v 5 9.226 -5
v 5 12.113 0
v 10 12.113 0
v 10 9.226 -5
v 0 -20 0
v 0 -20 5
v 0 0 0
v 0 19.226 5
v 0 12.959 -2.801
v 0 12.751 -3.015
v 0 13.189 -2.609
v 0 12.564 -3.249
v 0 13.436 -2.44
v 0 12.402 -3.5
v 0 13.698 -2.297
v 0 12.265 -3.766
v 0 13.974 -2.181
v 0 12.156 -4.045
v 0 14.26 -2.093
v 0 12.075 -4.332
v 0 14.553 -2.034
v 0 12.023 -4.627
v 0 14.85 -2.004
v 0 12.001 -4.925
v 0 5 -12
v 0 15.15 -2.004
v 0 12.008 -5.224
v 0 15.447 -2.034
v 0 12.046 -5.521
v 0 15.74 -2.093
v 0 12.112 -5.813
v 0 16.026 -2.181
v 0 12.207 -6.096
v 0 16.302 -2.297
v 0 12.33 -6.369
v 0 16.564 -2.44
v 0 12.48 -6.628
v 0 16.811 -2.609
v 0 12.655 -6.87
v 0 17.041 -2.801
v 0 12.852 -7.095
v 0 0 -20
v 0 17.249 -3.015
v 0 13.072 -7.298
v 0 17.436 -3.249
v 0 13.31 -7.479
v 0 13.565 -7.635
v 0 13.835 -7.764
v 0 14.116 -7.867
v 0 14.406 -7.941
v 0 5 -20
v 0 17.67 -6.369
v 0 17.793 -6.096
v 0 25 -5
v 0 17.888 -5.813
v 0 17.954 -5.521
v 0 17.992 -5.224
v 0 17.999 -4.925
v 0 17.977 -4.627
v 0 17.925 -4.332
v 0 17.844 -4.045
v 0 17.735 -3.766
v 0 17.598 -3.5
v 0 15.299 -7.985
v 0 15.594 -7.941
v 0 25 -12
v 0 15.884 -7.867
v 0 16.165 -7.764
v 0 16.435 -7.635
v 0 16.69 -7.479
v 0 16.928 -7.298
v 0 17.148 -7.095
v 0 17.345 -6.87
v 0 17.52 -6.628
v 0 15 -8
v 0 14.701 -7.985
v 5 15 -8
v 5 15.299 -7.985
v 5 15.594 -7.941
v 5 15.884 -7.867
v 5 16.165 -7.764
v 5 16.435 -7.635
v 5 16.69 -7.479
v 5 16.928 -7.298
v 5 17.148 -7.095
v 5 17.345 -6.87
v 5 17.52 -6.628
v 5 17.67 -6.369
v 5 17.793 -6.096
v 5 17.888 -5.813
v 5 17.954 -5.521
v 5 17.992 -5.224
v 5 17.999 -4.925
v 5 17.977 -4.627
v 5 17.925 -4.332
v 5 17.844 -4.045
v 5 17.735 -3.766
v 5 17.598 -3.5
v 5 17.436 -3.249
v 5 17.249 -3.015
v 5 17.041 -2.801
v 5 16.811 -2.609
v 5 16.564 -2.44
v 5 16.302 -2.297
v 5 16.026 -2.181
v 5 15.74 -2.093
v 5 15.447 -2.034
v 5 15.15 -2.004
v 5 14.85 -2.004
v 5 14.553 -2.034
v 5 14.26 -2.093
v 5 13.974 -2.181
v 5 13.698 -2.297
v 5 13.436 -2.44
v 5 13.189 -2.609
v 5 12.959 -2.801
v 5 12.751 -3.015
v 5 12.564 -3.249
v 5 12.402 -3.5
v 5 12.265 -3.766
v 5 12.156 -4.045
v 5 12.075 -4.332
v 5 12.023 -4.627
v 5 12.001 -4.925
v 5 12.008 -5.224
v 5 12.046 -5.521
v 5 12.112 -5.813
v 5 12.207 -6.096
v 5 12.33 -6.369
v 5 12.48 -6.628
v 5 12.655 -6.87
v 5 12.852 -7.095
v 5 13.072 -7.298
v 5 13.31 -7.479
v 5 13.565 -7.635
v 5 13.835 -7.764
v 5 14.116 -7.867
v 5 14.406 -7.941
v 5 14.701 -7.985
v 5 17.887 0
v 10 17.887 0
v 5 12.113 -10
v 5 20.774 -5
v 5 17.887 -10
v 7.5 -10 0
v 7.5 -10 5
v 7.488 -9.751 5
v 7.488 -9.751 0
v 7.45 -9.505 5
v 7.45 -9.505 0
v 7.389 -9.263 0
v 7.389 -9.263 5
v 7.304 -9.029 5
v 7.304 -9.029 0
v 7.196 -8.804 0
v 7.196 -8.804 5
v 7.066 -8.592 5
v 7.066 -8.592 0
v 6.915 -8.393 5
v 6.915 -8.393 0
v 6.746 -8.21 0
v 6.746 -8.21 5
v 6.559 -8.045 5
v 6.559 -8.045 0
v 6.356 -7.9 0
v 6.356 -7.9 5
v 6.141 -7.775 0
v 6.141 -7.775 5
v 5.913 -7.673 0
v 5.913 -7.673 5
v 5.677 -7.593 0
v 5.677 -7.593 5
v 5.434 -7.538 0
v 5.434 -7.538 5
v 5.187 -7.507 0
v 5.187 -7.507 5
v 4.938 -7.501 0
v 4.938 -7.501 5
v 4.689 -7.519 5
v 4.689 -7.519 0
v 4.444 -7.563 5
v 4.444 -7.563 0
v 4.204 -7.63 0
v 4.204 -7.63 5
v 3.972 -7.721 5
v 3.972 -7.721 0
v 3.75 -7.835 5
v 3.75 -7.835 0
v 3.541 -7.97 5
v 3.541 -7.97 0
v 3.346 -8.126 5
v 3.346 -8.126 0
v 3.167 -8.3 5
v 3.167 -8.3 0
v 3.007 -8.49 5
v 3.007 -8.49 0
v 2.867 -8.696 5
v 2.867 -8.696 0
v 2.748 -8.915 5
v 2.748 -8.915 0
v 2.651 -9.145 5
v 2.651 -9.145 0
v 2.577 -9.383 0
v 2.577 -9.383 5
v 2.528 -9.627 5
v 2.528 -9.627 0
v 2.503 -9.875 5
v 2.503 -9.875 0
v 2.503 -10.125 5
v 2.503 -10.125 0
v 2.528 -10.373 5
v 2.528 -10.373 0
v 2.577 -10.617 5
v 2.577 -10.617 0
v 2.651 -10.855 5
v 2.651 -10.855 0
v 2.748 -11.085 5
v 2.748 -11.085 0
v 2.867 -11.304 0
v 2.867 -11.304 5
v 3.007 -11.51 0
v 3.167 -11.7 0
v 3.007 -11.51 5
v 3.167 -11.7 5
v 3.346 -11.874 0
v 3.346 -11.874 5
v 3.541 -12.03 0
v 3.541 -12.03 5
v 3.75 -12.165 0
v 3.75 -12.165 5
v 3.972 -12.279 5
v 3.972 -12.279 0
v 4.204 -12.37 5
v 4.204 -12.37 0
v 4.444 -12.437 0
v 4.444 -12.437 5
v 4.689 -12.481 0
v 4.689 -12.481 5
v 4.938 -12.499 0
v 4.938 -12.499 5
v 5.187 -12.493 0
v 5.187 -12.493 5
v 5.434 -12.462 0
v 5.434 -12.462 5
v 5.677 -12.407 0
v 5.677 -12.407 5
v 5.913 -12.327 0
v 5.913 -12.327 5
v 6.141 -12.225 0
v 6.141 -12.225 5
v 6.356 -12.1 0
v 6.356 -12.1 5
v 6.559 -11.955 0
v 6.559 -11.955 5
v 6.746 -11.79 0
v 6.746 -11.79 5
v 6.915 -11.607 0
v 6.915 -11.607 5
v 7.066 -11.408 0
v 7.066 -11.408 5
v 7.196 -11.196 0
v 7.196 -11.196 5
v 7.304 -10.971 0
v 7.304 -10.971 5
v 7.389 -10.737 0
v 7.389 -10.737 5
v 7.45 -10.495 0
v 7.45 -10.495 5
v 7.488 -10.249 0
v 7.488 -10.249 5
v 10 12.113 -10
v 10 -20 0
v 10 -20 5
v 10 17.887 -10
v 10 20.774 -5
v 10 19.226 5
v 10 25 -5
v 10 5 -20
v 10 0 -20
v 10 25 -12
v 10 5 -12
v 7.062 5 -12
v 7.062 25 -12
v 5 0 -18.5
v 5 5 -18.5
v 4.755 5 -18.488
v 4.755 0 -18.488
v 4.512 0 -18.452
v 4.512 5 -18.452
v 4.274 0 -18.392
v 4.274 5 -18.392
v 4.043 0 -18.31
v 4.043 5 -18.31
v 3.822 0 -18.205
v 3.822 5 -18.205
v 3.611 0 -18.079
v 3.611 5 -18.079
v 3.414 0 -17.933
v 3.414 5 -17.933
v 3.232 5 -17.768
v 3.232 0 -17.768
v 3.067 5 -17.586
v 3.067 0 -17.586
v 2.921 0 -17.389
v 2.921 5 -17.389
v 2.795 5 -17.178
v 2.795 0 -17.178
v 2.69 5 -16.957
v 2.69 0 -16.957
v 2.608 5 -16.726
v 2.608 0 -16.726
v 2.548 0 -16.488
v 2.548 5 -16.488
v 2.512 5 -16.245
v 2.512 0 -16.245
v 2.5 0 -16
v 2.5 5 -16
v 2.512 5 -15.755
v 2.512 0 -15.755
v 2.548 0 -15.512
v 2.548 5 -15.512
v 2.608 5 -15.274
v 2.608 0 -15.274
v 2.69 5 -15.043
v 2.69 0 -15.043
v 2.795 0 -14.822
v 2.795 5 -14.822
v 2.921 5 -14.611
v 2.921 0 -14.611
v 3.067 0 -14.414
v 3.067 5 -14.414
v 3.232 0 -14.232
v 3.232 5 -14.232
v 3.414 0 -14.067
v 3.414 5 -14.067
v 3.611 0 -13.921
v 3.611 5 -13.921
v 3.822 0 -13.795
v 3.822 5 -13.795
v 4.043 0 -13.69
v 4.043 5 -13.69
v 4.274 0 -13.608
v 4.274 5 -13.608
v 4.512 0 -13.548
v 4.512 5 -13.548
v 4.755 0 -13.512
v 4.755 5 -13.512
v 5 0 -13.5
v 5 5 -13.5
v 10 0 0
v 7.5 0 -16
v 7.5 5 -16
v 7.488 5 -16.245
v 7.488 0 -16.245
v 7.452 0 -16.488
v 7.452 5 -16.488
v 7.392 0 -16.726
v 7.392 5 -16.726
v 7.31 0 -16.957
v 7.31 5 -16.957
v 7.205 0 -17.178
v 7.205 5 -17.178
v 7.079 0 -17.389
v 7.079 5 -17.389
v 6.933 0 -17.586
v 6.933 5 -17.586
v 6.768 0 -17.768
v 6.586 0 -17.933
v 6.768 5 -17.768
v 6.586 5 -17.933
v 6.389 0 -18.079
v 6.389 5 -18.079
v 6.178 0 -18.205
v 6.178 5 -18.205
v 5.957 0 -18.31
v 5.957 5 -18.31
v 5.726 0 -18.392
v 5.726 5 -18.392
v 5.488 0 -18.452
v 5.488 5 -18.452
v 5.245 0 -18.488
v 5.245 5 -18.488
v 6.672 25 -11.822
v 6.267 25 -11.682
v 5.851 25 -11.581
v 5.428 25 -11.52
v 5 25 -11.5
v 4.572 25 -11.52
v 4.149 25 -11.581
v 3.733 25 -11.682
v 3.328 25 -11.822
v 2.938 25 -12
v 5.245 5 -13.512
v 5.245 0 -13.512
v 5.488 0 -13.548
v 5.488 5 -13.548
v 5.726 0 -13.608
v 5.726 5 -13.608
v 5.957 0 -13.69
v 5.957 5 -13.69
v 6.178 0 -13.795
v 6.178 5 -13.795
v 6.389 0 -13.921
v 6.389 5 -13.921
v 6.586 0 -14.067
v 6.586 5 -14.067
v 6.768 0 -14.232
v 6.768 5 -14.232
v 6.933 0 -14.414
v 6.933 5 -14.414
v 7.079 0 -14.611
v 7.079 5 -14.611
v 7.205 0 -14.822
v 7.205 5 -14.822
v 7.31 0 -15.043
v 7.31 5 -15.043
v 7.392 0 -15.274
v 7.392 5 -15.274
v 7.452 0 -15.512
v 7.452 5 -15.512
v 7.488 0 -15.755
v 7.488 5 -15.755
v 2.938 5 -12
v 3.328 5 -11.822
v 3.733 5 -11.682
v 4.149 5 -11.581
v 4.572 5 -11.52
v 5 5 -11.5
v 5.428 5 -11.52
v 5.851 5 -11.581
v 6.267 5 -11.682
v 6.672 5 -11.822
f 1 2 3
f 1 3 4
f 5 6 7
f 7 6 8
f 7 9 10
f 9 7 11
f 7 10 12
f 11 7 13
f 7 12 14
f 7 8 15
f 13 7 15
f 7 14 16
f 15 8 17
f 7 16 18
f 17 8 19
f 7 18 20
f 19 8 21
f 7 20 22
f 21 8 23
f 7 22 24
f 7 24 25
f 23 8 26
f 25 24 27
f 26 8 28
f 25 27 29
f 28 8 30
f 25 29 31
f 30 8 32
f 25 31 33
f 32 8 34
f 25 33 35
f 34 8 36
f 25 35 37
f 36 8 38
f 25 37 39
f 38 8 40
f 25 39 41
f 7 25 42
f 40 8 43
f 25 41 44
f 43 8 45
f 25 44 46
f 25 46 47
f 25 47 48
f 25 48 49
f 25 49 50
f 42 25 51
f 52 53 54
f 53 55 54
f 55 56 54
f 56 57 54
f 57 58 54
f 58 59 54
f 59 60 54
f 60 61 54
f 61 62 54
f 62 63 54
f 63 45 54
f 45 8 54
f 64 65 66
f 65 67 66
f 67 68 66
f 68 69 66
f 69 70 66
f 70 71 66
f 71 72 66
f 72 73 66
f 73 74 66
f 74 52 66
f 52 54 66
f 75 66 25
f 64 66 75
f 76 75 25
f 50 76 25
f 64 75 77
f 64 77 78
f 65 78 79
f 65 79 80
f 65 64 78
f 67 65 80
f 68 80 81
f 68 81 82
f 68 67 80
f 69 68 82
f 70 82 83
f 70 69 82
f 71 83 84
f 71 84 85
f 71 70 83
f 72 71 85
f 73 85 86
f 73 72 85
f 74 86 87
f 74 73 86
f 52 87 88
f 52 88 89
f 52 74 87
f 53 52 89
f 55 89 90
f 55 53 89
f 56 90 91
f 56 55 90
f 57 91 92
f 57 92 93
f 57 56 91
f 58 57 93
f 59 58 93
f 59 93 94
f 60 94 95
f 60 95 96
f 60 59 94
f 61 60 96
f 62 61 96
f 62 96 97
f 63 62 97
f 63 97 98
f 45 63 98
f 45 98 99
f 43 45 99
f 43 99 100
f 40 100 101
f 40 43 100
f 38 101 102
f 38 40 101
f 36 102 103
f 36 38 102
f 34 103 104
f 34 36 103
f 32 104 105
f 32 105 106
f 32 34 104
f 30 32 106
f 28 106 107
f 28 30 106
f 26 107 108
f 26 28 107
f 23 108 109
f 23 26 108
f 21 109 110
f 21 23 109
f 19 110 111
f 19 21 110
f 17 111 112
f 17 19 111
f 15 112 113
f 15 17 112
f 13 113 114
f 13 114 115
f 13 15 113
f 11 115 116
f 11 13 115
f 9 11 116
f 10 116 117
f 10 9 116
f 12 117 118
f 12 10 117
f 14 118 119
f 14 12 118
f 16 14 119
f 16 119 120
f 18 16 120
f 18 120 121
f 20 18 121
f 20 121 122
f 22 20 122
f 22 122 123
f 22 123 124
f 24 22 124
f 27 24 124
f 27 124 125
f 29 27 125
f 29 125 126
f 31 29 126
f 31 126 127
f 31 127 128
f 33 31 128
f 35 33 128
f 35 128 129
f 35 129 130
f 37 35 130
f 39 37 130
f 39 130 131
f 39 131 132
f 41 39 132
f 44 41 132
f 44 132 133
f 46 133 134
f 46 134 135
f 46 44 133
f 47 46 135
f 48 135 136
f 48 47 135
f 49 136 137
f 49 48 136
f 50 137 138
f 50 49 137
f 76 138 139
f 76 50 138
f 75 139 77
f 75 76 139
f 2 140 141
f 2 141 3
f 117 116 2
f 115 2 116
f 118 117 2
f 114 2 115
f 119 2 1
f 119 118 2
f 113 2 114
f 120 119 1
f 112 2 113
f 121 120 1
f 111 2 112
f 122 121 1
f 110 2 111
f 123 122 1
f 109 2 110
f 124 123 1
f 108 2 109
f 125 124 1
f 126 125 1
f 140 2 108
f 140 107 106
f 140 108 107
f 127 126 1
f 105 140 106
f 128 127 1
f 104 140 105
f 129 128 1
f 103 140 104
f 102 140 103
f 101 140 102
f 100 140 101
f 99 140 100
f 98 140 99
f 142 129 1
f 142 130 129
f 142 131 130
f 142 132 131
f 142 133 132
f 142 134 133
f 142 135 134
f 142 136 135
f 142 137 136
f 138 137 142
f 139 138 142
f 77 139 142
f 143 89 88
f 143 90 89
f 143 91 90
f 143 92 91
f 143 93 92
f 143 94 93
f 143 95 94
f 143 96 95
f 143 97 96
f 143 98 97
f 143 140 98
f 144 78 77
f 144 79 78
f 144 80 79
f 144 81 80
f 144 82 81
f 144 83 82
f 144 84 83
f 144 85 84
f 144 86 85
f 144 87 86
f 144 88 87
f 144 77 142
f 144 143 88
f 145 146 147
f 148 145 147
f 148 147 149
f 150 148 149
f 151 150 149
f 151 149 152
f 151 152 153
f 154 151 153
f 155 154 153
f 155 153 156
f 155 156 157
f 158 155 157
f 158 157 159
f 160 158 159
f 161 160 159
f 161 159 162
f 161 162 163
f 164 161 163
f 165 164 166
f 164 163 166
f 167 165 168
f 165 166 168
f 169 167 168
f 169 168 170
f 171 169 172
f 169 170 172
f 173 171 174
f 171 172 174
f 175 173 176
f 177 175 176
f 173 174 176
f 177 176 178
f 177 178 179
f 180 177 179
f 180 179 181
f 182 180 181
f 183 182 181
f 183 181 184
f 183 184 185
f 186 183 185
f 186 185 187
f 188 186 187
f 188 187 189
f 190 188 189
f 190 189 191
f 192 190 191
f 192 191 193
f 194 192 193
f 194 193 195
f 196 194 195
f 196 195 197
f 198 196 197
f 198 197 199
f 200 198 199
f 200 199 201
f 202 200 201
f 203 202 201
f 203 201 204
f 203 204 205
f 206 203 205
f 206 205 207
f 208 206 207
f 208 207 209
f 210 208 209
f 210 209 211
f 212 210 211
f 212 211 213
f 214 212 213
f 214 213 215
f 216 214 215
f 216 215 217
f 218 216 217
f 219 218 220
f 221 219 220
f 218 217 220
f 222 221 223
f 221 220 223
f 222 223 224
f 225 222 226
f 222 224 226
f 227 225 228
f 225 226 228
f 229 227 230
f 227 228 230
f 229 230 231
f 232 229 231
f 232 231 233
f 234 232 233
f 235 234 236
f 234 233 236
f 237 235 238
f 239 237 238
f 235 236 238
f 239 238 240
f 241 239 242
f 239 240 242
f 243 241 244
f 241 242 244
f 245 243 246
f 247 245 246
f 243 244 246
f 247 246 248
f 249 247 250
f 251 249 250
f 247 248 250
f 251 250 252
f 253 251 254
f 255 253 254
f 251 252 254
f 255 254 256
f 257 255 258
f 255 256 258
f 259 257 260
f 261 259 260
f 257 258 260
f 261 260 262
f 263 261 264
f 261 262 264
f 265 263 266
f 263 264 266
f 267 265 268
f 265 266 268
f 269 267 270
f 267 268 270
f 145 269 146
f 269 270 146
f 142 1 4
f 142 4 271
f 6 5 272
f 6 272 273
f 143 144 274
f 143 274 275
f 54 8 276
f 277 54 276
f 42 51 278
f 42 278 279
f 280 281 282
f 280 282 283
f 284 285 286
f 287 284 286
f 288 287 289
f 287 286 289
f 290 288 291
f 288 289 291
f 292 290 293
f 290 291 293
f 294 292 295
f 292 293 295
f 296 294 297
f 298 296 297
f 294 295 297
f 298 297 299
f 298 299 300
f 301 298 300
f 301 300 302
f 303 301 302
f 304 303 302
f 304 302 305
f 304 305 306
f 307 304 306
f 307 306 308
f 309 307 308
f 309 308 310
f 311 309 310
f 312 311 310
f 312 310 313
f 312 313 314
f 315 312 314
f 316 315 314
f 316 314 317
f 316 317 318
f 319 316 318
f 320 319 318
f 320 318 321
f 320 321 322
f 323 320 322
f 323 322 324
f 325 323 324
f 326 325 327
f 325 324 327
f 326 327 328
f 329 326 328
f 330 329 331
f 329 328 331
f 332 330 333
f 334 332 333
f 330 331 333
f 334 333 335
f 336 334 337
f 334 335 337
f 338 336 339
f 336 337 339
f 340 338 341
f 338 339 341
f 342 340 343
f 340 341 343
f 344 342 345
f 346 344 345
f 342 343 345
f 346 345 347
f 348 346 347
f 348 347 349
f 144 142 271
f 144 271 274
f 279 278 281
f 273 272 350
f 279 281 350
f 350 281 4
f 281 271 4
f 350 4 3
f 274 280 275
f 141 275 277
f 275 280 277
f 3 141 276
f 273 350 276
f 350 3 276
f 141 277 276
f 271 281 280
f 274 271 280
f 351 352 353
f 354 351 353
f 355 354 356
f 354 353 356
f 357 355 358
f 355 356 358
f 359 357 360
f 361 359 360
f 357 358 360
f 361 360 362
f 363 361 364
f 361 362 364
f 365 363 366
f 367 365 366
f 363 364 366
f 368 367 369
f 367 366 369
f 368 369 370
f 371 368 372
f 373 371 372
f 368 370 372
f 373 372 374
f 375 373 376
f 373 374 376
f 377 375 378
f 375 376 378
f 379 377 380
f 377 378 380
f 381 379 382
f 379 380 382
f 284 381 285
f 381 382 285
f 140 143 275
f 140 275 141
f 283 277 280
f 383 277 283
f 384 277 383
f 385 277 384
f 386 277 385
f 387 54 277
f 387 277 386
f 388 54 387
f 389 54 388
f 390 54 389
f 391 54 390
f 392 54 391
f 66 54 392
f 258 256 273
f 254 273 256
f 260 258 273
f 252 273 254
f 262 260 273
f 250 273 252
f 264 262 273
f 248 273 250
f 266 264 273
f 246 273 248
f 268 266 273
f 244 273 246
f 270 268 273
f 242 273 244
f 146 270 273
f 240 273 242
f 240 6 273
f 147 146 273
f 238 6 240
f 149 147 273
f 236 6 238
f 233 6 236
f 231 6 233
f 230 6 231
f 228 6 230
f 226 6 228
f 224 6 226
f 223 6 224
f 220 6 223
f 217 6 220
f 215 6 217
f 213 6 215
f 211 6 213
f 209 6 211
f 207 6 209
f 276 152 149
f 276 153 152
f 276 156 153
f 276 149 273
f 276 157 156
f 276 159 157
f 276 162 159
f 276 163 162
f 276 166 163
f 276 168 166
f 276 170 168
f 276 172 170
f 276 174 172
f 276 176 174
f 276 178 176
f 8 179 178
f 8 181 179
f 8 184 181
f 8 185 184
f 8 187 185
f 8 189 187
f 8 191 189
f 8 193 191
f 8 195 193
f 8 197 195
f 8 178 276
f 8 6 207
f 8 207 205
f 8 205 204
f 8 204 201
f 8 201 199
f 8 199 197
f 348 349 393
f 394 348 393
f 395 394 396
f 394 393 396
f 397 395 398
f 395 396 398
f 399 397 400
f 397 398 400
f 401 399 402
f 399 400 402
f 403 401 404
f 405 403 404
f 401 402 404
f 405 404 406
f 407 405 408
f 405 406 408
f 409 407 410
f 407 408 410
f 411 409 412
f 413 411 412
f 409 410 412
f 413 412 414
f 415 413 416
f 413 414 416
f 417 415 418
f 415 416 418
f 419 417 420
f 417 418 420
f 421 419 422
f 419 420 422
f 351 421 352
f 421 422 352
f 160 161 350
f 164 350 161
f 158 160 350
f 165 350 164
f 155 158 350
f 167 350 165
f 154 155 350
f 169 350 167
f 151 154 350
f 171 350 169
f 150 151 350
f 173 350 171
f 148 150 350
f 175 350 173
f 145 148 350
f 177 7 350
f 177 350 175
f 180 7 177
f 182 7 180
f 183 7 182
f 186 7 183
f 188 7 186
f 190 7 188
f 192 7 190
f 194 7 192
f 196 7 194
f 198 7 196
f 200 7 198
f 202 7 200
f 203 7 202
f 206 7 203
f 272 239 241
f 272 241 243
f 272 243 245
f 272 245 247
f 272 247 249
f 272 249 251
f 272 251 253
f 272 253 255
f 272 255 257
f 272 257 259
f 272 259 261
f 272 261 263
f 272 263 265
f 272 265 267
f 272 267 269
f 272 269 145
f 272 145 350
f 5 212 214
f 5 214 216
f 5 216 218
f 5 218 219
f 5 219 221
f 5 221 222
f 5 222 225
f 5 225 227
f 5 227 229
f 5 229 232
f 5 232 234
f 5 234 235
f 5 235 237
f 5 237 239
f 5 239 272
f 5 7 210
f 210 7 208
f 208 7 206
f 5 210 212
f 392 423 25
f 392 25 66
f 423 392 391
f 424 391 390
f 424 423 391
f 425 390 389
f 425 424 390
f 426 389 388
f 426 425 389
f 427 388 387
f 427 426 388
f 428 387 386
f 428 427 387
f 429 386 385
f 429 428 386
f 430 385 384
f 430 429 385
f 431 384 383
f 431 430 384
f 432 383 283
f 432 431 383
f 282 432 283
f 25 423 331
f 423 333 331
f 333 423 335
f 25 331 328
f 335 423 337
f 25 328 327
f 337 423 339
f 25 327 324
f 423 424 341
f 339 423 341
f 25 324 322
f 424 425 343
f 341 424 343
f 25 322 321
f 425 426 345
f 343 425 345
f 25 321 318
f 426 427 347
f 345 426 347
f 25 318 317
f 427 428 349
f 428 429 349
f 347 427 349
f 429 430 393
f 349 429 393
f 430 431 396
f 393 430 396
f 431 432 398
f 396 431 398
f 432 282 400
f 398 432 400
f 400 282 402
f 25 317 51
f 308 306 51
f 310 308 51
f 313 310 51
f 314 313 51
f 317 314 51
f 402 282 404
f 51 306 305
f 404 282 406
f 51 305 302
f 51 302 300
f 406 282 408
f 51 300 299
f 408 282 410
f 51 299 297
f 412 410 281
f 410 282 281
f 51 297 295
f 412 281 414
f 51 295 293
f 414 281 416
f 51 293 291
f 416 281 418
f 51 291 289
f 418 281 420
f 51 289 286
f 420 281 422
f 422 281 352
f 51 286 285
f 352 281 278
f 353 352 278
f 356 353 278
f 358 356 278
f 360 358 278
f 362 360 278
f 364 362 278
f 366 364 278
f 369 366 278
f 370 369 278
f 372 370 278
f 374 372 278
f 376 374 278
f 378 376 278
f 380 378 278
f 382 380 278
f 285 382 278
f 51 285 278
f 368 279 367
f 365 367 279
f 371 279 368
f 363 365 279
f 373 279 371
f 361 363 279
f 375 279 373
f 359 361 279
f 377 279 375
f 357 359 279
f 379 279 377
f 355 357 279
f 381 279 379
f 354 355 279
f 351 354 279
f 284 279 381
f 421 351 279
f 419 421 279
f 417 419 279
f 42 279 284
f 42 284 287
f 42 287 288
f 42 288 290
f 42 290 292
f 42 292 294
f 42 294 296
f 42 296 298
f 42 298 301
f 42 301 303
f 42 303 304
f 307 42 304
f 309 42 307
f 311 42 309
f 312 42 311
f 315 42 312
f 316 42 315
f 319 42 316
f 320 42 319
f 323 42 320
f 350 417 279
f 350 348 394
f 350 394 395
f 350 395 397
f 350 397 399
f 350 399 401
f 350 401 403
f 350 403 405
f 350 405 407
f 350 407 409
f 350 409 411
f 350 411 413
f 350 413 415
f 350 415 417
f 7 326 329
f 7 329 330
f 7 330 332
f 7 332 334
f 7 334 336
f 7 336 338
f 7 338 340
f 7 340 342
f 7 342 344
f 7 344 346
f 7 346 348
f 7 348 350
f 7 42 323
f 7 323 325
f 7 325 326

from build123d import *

# Parameters (mm, degrees)
SKETCH_1_R          = 3
EXTRUDE_1_DEPTH     = 5
EXTRUDE_START       = 5
EXTRUDE_2_DEPTH     = 5
SKETCH_3_R          = 2.5
CUT_EXTRUDE_1_DEPTH = 37.742346142
CHAMFER_1_SIZE      = 10
CHAMFER_1_SIZE2     = 5.773502692
SKETCH_4_W          = 8
SKETCH_4_H          = 20
CUT_EXTRUDE_2_DEPTH = 34.541019662
SKETCH_5_R          = 4.5
CUT_EXTRUDE_3_DEPTH = 34.541019662
CUT_EXTRUDE_4_DEPTH = 34.541019662


with BuildPart() as part:
    # 스케치1 → 보스-돌출1 (new body)
    # profile 1 of 2: a face of its own
    with BuildSketch(Plane(origin=(0, 0, 0), x_dir=(0, 0, -1), z_dir=(1, 0, 0))):
        Polygon((20, 0), (0, 0), (0, -20), (-5, -20), (-5, 25), (20, 25), align=None)
        Polygon((10, 17.886751346), (5, 20.773502692), (0, 17.886751346), (0, 12.113248654), (5, 9.226497308), (10, 12.113248654), align=None, mode=Mode.SUBTRACT)
    # profile 2 of 2: a face of its own
    with BuildSketch(Plane(origin=(0, 0, 0), x_dir=(0, 0, -1), z_dir=(1, 0, 0))):
        Polygon((10, 12.113248654), (10, 17.886751346), (5, 20.773502692), (0, 17.886751346), (0, 12.113248654), (5, 9.226497308), align=None)
        with Locations((5, 15)):
            Circle(SKETCH_1_R, mode=Mode.SUBTRACT)
    extrude(amount=EXTRUDE_1_DEPTH)

    # 스케치1<3> → 보스-돌출2 (add)
    with BuildSketch(Plane(origin=(0, 0, 0), x_dir=(0, 0, -1), z_dir=(1, 0, 0)).offset(EXTRUDE_START)):
        Polygon((20, 0), (0, 0), (0, -20), (-5, -20), (-5, 25), (20, 25), align=None)
        Polygon((10, 17.886751346), (5, 20.773502692), (0, 17.886751346), (0, 12.113248654), (5, 9.226497308), (10, 12.113248654), align=None, mode=Mode.SUBTRACT)
    extrude(amount=EXTRUDE_2_DEPTH)

    # 스케치3 → 컷-돌출1 (cut, through all)
    with BuildSketch(Plane.XY.offset(5)):
        with Locations((5, -10)):
            Circle(SKETCH_3_R)
    extrude(amount=-CUT_EXTRUDE_1_DEPTH, mode=Mode.SUBTRACT)

    # 모따기1
    chamfer_1_edges = [part.edges().sort_by_distance(p)[0] for p in [
        (5, 25, 5),
    ]]
    chamfer_1_side = [part.faces().sort_by_distance(p)[0] for p in [
        (5, 25, -7.5),
    ]]
    chamfer(chamfer_1_edges, length=CHAMFER_1_SIZE, length2=CHAMFER_1_SIZE2, reference=chamfer_1_side[0])

    # 스케치4 → 컷-돌출2 (cut, through all)
    with BuildSketch(Plane(origin=(10, 0, 0), x_dir=(0, 0, -1), z_dir=(1, 0, 0))):
        with Locations((16, 15)):
            Rectangle(SKETCH_4_W, SKETCH_4_H)
    extrude(amount=-CUT_EXTRUDE_2_DEPTH, mode=Mode.SUBTRACT)

    # 스케치5 → 컷-돌출3 (cut, through all)
    with BuildSketch(Plane(origin=(0, 5, 0), x_dir=(1, 0, 0), z_dir=(0, 1, 0))):
        with Locations((5, 16)):
            Circle(SKETCH_5_R)
    extrude(amount=CUT_EXTRUDE_3_DEPTH, mode=Mode.SUBTRACT)

    # 스케치5<3> → 컷-돌출4 (cut, through all)
    with BuildSketch(Plane(origin=(0, 5, 0), x_dir=(1, 0, 0), z_dir=(0, 1, 0))):
        with BuildLine():
            ThreePointArc((5, 18.5), (2.5, 16), (5, 13.5))
            Line((5, 13.5), (5, 18.5))
        make_face()
        with BuildLine():
            Line((5, 18.5), (5, 13.5))
            ThreePointArc((5, 13.5), (6.767766953, 14.232233047), (7.5, 16))
            ThreePointArc((7.5, 16), (6.767766953, 17.767766953), (5, 18.5))
        make_face()
    extrude(amount=-CUT_EXTRUDE_4_DEPTH, mode=Mode.SUBTRACT)


solid = part.part
